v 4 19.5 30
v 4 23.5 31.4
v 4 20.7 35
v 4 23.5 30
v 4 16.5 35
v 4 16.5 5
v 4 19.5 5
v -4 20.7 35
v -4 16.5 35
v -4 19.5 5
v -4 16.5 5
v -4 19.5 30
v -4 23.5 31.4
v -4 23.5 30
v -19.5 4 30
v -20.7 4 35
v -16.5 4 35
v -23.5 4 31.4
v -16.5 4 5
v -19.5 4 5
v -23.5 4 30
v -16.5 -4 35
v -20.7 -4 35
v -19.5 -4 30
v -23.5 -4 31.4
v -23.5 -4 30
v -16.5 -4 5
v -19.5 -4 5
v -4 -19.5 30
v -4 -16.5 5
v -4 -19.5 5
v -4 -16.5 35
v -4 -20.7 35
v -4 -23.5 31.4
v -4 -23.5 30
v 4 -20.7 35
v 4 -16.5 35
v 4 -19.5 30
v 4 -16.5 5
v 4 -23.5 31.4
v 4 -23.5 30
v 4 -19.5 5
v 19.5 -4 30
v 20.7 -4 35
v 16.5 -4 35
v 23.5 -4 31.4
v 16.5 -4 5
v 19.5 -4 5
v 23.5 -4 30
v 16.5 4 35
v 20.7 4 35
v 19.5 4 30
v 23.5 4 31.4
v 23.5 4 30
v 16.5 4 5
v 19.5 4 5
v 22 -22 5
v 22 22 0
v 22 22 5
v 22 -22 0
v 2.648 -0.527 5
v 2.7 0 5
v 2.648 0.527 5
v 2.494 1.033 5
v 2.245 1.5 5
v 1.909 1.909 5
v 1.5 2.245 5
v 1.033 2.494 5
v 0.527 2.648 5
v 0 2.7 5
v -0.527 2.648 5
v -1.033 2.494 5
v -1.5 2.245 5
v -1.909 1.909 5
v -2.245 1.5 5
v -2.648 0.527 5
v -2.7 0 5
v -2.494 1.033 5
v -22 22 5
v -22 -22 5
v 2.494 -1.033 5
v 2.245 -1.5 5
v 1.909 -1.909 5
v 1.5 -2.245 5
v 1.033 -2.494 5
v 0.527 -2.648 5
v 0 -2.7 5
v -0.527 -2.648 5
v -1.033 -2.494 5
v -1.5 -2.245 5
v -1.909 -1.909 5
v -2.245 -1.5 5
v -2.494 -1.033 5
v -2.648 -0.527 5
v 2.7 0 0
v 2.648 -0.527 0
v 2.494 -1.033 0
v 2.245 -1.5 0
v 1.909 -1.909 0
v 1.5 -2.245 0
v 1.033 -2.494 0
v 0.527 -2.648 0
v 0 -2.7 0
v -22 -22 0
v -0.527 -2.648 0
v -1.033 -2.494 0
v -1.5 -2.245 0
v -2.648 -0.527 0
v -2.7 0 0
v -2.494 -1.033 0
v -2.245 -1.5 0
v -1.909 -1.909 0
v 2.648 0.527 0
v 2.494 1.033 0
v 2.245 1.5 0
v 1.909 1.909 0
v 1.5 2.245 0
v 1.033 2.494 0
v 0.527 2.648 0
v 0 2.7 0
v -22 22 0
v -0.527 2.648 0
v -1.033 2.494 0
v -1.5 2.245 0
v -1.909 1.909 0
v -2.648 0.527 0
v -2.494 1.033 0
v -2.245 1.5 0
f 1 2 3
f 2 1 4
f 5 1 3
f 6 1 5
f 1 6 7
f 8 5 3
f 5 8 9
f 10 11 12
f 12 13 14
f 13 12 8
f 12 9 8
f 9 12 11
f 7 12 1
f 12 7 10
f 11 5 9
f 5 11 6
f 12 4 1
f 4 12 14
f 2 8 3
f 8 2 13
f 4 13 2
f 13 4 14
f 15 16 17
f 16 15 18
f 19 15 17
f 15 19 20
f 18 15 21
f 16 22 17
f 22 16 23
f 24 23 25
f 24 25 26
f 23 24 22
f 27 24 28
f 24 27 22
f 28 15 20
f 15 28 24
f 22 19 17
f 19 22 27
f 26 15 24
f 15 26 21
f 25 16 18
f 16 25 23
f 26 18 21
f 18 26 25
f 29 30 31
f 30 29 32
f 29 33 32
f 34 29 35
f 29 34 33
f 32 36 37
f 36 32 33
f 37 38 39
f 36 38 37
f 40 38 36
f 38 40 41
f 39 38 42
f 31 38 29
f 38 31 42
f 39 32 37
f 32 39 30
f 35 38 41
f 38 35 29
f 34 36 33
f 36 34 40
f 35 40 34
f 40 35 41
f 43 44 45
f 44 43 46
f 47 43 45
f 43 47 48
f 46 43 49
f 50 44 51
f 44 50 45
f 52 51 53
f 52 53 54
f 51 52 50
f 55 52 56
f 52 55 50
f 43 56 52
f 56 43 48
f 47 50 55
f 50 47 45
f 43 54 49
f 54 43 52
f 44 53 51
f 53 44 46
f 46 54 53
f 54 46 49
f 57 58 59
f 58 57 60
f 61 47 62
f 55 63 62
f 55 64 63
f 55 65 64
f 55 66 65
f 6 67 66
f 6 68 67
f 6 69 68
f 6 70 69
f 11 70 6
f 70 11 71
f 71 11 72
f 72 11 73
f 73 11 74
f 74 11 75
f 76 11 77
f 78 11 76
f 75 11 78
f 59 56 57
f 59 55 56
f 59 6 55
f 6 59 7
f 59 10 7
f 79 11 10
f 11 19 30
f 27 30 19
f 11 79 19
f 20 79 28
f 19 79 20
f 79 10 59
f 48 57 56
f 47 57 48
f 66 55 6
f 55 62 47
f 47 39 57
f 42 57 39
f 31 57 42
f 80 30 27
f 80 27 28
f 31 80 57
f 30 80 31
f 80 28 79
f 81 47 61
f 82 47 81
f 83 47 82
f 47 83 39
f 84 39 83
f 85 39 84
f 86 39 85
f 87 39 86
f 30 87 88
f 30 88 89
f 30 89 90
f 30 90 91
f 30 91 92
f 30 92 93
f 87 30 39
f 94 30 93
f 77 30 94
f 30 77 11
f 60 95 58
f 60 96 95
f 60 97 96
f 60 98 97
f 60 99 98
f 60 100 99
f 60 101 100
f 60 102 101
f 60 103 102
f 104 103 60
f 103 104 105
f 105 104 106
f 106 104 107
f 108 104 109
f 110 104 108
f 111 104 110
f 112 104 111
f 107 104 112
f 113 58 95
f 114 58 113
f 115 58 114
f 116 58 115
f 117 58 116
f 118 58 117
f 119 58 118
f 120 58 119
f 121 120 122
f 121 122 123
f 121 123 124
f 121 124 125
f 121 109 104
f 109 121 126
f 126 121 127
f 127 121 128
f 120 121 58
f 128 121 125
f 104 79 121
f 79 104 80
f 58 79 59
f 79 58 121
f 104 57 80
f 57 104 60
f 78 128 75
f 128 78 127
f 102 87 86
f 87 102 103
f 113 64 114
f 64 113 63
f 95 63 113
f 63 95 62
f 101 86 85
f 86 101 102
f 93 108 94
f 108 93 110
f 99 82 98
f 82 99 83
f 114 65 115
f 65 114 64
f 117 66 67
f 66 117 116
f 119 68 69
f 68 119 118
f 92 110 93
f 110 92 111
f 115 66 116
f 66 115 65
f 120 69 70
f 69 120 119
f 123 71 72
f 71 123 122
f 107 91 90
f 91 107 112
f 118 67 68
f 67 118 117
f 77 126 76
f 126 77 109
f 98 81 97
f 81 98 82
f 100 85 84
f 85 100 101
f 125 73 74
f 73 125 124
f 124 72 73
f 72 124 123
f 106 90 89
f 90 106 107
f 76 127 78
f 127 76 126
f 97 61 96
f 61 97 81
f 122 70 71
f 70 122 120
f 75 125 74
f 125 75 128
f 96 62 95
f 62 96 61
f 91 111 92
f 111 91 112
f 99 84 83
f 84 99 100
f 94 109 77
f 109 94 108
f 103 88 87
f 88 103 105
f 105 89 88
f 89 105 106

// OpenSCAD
$fn = 32;

// ----------------------------------------------------------------------
// Snap-fit latch: 4 arms, 30 mm tall, 4.2 mm undercut hooks
// ----------------------------------------------------------------------

// --- parameters (mm) ---
base_d = 44;              // base plate depth
base_h = 5;               // base plate thickness
span = 36;                // distance between opposite arms
arm_t = 3;                // arm thickness
arm_d = 8;                // arm width
height = 30;              // free arm length
head_len = 4.2;           // hook reach
head_h = 5;               // hook height
lead = 1.4;               // lead-in ramp thickness
bore_d = 5.4;             // base fixing bore
top_z = 35;               // height of the arm tips above the base

arms = 4;

difference() {
  union() {
    /* base plate, centred on the arm ring */
    translate([-22, -22, 0]) cube([base_d, base_d, base_h]);
    for (a = [0 : 360 / arms : 359]) rotate([0, 0, a]) {
    /* arm, sunk 0.5 mm into the base */
    translate([-arm_d / 2, span / 2 - arm_t / 2, base_h - 0.5]) cube([arm_d, arm_t, height + 0.5]);
    /* hook: a convex hull of a tall inner block and a thin outer lip
       gives a flat undercut below and a lead-in ramp on top */
    hull() {
      translate([-arm_d / 2, span / 2 + arm_t / 2 - 0.6, top_z - head_h]) cube([arm_d, lead + 0.4, head_h]);
      translate([-arm_d / 2, span / 2 + arm_t / 2 - 0.2, top_z - head_h]) cube([arm_d, head_len, lead]);
    }
    }
  }
  translate([0, 0, -2.5]) cylinder(h = base_h + 5, d = bore_d);
}
